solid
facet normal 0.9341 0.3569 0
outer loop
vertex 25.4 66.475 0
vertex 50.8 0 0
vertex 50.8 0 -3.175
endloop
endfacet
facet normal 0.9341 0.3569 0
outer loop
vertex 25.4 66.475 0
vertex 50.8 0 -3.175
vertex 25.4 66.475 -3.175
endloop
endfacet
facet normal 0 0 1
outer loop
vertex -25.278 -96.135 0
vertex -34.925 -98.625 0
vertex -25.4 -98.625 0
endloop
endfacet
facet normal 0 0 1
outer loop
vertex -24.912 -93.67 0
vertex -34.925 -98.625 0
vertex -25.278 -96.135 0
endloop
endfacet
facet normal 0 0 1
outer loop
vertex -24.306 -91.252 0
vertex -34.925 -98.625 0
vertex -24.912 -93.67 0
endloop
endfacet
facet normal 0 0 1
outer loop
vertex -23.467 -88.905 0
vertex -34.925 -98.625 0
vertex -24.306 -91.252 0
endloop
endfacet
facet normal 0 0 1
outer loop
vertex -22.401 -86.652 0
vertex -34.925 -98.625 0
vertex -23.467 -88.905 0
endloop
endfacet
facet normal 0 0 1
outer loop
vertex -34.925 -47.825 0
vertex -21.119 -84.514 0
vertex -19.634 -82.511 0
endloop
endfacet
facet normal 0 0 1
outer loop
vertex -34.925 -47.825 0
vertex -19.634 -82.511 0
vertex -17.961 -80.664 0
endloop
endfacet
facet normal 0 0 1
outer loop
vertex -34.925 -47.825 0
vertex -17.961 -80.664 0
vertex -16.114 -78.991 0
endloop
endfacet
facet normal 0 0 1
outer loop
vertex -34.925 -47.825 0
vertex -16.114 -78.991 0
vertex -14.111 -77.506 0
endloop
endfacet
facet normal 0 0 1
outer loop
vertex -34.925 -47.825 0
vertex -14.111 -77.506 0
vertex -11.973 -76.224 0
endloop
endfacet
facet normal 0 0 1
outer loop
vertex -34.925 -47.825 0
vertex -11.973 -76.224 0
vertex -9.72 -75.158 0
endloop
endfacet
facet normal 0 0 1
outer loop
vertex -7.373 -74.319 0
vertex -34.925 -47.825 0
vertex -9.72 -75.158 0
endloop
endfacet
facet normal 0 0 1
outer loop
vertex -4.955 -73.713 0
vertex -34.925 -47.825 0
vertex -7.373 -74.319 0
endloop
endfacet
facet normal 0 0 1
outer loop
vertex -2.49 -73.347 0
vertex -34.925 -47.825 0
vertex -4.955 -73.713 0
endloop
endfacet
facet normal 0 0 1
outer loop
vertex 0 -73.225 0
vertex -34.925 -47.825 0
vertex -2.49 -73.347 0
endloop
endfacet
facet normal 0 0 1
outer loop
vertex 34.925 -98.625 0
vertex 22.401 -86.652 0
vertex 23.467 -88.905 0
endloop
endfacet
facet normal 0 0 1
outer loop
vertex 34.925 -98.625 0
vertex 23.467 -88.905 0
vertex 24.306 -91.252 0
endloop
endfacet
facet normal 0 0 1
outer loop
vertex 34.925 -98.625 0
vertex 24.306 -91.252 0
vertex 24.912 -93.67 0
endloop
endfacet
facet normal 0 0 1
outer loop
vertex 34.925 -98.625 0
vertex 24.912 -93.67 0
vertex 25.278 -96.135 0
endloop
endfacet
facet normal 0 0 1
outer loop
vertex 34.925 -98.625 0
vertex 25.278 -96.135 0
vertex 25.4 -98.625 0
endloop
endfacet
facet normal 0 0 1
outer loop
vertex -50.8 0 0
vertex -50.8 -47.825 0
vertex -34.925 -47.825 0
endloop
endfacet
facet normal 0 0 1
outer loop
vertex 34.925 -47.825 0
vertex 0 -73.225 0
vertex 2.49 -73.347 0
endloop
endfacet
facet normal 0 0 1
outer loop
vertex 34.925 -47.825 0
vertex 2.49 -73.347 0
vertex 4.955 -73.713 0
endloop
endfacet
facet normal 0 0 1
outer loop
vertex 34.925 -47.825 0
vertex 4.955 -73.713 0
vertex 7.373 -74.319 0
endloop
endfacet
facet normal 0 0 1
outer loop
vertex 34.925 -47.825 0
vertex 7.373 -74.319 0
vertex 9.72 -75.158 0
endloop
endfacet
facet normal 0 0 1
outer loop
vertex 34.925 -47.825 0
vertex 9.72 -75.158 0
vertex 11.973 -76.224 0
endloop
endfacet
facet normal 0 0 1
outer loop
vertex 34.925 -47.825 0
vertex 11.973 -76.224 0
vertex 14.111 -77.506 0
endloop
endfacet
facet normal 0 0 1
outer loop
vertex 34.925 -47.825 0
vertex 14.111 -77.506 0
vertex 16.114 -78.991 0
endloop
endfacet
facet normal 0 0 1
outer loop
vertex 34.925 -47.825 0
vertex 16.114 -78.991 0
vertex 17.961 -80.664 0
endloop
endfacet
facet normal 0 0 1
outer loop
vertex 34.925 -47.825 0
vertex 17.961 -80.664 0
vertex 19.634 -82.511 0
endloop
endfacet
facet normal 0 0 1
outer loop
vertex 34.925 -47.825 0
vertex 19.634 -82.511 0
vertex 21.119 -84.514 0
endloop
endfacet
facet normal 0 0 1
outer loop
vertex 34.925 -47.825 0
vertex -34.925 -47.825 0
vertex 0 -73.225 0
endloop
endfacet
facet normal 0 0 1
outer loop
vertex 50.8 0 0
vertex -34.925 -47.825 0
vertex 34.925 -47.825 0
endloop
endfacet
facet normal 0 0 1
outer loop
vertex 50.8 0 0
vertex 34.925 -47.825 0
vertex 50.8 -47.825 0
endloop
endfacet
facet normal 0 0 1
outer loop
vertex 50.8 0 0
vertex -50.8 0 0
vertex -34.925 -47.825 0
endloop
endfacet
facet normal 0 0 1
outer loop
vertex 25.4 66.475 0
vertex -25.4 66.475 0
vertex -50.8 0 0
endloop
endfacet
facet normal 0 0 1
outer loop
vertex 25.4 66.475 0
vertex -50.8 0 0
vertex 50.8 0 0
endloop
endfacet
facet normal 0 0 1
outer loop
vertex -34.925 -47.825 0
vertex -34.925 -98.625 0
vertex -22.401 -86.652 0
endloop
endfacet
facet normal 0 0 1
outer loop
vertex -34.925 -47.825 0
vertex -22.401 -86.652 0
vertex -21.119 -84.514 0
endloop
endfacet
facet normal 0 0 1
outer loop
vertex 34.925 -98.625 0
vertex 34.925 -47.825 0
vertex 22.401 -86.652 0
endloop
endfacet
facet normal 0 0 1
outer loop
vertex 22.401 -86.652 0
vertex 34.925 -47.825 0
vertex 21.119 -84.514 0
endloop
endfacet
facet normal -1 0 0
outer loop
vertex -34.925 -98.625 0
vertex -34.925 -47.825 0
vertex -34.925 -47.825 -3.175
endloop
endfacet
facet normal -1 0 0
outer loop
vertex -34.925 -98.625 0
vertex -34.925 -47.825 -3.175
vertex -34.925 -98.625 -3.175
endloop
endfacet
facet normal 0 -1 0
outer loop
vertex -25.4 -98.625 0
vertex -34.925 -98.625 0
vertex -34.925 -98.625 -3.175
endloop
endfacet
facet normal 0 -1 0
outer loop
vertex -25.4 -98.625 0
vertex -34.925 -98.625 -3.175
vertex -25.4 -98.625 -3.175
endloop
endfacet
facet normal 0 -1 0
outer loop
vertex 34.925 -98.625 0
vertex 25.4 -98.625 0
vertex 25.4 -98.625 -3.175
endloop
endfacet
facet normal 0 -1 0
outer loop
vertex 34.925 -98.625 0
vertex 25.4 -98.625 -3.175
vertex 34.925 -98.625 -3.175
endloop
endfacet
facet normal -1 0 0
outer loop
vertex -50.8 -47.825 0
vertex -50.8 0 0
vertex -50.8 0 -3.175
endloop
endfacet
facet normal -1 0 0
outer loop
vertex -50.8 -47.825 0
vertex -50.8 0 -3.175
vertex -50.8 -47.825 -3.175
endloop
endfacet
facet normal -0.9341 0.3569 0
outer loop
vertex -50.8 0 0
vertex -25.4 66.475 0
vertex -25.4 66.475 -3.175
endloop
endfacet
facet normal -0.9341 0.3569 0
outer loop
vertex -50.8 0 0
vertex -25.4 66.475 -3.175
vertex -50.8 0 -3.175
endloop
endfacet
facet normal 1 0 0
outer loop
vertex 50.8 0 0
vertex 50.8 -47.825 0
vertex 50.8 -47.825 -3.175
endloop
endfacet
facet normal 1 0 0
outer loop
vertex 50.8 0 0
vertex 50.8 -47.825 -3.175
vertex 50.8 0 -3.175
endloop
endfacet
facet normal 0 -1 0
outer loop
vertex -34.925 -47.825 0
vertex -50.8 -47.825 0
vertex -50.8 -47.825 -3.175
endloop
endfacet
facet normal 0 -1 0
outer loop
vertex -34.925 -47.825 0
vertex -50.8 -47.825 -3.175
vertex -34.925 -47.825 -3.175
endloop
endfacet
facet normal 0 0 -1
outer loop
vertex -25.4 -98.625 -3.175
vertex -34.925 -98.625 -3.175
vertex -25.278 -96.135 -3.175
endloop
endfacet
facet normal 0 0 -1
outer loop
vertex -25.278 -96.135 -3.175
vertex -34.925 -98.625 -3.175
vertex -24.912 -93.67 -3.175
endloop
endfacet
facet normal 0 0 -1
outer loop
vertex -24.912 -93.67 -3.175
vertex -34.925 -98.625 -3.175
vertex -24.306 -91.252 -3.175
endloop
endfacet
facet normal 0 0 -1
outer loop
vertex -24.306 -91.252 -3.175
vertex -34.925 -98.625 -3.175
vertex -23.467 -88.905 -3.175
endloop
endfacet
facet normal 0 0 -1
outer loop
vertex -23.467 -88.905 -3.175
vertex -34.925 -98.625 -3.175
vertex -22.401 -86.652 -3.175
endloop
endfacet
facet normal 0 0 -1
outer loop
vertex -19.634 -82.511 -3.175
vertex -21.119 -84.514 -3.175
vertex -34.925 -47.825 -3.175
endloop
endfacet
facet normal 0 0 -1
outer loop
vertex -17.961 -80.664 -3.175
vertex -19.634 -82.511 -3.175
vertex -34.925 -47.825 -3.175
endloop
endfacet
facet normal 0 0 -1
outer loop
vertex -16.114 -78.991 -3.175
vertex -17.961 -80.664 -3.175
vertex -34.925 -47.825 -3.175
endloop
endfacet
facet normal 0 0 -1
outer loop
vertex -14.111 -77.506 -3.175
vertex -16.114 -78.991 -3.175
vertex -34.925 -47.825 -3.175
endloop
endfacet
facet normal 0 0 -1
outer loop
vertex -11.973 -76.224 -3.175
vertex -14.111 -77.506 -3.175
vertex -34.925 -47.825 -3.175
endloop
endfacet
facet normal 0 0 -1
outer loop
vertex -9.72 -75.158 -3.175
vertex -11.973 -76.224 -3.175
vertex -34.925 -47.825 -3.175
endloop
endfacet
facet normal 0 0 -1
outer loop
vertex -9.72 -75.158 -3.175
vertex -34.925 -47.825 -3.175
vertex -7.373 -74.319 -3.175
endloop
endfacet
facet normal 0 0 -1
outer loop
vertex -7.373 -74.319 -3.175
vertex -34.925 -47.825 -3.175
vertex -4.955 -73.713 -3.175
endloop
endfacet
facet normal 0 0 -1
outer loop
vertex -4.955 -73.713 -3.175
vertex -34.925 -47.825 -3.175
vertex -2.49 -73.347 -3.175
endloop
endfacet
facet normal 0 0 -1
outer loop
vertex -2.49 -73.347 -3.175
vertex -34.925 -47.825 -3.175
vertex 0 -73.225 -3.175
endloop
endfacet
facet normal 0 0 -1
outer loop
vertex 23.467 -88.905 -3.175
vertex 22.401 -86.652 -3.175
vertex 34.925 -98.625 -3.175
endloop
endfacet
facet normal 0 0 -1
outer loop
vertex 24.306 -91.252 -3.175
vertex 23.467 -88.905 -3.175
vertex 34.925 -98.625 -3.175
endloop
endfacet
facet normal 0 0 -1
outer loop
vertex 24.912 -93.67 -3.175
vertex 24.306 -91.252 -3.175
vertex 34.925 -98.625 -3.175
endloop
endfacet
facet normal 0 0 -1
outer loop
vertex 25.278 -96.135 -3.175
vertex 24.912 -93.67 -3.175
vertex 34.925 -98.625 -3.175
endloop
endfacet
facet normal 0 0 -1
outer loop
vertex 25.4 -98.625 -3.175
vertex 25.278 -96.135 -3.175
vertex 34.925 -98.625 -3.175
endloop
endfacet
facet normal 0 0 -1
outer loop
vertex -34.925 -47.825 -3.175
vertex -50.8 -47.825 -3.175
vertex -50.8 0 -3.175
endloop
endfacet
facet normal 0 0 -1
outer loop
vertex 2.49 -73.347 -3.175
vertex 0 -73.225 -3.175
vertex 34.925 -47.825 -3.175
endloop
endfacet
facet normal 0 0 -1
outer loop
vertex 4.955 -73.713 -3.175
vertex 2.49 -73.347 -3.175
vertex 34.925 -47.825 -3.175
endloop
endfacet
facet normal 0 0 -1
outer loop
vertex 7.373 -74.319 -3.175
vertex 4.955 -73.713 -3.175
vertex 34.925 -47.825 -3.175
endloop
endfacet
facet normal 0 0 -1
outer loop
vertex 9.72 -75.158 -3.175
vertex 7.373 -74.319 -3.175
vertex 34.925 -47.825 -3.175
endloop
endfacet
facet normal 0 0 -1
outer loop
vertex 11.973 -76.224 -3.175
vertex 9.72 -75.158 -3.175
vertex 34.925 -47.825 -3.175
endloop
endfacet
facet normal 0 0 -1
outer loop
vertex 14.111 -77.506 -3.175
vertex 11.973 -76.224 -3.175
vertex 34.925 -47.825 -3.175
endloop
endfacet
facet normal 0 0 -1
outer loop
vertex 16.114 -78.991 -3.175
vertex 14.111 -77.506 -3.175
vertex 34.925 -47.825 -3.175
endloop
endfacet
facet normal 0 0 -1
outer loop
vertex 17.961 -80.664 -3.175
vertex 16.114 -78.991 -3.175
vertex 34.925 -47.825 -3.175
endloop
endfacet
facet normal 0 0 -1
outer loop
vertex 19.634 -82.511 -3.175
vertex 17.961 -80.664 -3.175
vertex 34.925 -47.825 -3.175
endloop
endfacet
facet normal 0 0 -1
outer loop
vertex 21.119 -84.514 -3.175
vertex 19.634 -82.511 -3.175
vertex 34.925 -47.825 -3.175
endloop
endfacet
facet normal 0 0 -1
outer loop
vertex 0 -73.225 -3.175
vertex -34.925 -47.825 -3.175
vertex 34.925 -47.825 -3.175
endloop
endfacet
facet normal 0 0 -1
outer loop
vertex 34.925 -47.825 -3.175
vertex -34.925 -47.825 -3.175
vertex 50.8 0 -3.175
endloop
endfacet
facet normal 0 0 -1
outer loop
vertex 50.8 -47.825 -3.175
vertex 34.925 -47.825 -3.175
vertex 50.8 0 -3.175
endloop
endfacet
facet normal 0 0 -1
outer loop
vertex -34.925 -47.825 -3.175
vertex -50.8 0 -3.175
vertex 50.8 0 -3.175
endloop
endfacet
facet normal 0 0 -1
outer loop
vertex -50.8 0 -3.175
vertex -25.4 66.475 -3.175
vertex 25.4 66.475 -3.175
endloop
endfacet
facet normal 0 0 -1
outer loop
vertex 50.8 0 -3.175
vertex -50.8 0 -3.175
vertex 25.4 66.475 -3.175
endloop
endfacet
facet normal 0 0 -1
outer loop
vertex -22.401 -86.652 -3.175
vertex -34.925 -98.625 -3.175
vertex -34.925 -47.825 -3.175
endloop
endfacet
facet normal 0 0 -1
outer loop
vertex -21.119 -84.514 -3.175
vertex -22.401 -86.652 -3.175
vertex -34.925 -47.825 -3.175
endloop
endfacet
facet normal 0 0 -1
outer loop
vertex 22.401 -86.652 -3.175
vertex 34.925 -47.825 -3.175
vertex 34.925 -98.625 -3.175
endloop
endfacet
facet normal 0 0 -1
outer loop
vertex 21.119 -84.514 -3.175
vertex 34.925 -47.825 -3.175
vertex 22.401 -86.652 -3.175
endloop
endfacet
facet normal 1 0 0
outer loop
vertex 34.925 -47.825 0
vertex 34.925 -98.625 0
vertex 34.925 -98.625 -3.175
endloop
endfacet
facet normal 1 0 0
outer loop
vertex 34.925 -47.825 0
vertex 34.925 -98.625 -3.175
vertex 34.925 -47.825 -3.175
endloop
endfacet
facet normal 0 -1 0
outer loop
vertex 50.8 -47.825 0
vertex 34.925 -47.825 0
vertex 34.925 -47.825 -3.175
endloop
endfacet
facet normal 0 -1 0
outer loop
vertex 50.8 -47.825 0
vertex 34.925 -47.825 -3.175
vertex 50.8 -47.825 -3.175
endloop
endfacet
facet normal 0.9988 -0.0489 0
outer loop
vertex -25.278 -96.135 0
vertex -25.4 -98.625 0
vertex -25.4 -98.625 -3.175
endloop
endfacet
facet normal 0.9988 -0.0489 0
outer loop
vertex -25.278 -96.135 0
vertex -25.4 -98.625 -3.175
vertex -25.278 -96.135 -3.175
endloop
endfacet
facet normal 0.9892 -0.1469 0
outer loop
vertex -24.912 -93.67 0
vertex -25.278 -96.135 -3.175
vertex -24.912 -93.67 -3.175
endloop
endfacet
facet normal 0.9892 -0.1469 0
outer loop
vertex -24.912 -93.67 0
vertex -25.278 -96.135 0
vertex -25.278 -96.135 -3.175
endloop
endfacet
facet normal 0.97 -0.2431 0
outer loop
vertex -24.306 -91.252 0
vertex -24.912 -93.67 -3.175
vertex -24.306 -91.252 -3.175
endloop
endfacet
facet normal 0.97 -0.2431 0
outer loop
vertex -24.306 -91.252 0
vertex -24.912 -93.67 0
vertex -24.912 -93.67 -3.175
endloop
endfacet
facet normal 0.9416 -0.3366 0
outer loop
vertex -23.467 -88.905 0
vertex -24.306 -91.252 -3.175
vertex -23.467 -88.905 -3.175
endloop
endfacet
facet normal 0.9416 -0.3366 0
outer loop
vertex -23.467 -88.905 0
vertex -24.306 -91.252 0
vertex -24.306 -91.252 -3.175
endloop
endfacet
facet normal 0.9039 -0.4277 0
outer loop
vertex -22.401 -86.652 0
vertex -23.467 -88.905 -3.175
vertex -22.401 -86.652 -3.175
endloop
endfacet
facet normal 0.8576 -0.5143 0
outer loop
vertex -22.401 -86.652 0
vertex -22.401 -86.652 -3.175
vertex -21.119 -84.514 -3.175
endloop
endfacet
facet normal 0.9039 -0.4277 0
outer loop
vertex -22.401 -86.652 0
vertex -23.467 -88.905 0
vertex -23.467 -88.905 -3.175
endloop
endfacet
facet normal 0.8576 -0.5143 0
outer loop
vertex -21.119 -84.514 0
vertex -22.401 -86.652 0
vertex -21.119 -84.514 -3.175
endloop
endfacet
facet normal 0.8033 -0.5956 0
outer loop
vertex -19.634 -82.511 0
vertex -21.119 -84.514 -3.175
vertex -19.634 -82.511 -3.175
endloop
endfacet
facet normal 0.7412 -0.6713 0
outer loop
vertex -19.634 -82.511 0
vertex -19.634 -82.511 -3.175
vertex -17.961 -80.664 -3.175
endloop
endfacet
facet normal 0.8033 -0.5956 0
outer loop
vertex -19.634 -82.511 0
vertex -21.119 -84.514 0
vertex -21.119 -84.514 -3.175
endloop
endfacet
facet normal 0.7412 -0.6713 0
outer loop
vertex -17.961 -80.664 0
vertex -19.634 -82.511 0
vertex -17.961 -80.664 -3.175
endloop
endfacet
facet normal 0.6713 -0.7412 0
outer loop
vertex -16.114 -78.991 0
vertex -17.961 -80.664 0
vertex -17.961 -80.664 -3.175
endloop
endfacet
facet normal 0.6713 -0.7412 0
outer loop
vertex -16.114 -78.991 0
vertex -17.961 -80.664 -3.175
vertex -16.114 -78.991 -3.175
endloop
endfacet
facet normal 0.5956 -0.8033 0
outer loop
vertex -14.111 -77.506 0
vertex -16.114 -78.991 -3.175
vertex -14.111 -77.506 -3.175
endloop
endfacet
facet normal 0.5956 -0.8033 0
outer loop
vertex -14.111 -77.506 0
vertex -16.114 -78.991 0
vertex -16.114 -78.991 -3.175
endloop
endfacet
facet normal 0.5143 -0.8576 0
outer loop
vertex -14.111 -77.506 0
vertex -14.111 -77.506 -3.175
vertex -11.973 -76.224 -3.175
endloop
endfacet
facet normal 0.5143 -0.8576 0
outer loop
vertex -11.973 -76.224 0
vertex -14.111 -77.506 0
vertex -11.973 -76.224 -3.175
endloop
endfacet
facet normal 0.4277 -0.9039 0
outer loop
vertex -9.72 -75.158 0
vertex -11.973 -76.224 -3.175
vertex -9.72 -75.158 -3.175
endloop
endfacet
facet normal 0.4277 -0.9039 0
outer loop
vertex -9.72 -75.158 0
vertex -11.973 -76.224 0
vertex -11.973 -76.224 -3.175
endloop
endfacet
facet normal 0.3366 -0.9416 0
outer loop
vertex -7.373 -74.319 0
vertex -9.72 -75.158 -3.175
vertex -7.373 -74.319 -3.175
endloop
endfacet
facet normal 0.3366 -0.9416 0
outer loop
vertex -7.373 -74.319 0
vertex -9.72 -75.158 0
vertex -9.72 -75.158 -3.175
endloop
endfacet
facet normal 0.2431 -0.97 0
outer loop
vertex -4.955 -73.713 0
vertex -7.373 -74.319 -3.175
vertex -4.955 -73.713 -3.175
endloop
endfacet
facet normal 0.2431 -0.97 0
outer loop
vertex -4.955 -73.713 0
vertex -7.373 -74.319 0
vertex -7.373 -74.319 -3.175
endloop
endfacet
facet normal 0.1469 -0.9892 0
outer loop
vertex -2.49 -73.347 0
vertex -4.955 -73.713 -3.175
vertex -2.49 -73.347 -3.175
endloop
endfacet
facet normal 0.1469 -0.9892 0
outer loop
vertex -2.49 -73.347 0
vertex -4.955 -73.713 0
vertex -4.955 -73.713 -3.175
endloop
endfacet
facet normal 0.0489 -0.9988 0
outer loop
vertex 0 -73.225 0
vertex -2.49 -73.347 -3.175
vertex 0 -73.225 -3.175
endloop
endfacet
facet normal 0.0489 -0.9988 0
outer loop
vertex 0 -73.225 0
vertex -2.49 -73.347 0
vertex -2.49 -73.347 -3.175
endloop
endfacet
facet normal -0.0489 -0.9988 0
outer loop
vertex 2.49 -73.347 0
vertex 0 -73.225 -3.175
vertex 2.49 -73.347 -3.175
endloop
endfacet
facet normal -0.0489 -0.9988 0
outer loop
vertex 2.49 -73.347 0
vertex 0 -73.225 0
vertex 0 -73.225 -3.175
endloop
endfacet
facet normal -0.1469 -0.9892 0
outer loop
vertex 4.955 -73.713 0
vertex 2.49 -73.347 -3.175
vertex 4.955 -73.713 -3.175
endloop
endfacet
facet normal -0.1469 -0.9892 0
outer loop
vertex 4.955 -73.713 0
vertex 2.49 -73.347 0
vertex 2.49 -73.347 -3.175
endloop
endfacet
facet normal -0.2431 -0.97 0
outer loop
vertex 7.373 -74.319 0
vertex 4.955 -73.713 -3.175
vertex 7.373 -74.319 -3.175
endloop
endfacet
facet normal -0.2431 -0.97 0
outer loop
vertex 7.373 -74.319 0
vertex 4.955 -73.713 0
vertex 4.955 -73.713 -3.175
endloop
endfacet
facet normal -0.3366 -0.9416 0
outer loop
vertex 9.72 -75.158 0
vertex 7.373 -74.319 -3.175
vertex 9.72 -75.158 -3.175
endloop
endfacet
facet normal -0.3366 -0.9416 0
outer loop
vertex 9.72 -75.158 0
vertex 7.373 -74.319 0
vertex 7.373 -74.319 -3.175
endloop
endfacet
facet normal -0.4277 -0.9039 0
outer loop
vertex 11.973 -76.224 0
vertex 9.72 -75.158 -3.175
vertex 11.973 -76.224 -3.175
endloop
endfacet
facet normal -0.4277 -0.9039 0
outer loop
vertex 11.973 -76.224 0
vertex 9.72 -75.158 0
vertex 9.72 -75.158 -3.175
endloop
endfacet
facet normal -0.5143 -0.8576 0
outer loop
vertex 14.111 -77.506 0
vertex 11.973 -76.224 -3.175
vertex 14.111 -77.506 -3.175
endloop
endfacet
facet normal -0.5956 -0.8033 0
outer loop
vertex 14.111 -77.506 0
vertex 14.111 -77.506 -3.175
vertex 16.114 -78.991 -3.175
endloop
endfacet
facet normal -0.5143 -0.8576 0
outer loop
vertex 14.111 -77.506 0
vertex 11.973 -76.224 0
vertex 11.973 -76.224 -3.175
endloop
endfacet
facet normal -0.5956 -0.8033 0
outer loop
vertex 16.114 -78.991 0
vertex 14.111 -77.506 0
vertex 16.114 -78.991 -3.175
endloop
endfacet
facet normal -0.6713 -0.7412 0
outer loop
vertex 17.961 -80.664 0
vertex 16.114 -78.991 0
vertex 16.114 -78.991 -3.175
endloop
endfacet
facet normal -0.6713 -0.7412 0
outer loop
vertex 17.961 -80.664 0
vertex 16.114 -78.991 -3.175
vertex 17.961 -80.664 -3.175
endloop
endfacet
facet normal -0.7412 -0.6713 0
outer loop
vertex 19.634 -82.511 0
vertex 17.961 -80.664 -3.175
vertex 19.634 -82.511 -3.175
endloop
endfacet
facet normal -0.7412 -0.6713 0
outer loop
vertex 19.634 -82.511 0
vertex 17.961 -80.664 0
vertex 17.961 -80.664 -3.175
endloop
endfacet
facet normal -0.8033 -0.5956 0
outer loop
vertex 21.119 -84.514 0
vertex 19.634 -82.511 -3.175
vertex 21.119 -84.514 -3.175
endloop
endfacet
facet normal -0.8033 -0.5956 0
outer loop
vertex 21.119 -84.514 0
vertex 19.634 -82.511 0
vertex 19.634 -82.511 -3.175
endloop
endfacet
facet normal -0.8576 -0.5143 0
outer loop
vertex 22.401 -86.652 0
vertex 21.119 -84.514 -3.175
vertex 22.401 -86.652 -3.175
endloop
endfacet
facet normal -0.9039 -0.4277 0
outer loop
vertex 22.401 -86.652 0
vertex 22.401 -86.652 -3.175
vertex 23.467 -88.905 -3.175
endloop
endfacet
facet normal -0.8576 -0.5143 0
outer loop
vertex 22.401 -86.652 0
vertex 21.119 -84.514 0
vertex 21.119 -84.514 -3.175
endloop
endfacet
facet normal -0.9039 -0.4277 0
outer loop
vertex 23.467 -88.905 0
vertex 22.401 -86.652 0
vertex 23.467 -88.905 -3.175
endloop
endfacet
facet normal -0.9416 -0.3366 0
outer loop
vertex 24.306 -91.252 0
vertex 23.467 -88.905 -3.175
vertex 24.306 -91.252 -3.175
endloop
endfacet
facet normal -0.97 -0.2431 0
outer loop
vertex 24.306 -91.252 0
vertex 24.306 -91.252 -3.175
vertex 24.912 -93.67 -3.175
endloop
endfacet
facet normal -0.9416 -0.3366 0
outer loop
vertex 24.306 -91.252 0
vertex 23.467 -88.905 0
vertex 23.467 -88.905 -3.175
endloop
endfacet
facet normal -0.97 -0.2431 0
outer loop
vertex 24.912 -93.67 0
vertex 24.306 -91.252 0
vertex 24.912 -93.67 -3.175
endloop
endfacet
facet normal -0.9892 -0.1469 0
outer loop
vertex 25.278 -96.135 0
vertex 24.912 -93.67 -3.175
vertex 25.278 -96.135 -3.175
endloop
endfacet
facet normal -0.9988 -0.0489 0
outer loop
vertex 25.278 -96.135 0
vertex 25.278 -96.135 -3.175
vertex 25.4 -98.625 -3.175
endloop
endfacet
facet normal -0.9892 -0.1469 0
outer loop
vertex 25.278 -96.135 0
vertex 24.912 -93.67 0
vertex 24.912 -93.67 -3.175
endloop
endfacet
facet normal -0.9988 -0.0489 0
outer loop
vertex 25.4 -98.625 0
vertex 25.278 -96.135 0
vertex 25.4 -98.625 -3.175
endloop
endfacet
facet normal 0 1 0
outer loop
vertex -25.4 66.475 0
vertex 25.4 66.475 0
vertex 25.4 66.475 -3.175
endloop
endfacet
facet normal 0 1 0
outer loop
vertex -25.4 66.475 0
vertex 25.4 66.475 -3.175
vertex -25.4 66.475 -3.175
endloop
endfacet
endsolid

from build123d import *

# Parameters (mm, degrees)
F1_DEPTH = 3.175


# Not quite as in the source:
# - a length typed as a fraction of an inch, garbled in the dataset ("3 / 203.2 mm" for 3/8 in), is restored


with BuildPart() as f1:
    # F0 (on Top) → F1 (new body)
    with BuildSketch(Plane.XY):
        with BuildLine():
            Line((50.8, 0), (25.4, 66.475))
            Line((25.4, 66.475), (-25.4, 66.475))
            Line((-25.4, 66.475), (-50.8, 0))
            Line((-50.8, 0), (-50.8, -47.825))
            Line((-50.8, -47.825), (-34.925, -47.825))
            Line((-34.925, -47.825), (-34.925, -98.625))
            Line((-34.925, -98.625), (-25.4, -98.625))
            ThreePointArc((-25.4, -98.625), (0, -73.225), (25.4, -98.625))
            Line((25.4, -98.625), (34.925, -98.625))
            Line((34.925, -98.625), (34.925, -47.825))
            Line((34.925, -47.825), (50.8, -47.825))
            Line((50.8, -47.825), (50.8, 0))
        make_face()
    extrude(amount=-F1_DEPTH)


solid = f1.part
